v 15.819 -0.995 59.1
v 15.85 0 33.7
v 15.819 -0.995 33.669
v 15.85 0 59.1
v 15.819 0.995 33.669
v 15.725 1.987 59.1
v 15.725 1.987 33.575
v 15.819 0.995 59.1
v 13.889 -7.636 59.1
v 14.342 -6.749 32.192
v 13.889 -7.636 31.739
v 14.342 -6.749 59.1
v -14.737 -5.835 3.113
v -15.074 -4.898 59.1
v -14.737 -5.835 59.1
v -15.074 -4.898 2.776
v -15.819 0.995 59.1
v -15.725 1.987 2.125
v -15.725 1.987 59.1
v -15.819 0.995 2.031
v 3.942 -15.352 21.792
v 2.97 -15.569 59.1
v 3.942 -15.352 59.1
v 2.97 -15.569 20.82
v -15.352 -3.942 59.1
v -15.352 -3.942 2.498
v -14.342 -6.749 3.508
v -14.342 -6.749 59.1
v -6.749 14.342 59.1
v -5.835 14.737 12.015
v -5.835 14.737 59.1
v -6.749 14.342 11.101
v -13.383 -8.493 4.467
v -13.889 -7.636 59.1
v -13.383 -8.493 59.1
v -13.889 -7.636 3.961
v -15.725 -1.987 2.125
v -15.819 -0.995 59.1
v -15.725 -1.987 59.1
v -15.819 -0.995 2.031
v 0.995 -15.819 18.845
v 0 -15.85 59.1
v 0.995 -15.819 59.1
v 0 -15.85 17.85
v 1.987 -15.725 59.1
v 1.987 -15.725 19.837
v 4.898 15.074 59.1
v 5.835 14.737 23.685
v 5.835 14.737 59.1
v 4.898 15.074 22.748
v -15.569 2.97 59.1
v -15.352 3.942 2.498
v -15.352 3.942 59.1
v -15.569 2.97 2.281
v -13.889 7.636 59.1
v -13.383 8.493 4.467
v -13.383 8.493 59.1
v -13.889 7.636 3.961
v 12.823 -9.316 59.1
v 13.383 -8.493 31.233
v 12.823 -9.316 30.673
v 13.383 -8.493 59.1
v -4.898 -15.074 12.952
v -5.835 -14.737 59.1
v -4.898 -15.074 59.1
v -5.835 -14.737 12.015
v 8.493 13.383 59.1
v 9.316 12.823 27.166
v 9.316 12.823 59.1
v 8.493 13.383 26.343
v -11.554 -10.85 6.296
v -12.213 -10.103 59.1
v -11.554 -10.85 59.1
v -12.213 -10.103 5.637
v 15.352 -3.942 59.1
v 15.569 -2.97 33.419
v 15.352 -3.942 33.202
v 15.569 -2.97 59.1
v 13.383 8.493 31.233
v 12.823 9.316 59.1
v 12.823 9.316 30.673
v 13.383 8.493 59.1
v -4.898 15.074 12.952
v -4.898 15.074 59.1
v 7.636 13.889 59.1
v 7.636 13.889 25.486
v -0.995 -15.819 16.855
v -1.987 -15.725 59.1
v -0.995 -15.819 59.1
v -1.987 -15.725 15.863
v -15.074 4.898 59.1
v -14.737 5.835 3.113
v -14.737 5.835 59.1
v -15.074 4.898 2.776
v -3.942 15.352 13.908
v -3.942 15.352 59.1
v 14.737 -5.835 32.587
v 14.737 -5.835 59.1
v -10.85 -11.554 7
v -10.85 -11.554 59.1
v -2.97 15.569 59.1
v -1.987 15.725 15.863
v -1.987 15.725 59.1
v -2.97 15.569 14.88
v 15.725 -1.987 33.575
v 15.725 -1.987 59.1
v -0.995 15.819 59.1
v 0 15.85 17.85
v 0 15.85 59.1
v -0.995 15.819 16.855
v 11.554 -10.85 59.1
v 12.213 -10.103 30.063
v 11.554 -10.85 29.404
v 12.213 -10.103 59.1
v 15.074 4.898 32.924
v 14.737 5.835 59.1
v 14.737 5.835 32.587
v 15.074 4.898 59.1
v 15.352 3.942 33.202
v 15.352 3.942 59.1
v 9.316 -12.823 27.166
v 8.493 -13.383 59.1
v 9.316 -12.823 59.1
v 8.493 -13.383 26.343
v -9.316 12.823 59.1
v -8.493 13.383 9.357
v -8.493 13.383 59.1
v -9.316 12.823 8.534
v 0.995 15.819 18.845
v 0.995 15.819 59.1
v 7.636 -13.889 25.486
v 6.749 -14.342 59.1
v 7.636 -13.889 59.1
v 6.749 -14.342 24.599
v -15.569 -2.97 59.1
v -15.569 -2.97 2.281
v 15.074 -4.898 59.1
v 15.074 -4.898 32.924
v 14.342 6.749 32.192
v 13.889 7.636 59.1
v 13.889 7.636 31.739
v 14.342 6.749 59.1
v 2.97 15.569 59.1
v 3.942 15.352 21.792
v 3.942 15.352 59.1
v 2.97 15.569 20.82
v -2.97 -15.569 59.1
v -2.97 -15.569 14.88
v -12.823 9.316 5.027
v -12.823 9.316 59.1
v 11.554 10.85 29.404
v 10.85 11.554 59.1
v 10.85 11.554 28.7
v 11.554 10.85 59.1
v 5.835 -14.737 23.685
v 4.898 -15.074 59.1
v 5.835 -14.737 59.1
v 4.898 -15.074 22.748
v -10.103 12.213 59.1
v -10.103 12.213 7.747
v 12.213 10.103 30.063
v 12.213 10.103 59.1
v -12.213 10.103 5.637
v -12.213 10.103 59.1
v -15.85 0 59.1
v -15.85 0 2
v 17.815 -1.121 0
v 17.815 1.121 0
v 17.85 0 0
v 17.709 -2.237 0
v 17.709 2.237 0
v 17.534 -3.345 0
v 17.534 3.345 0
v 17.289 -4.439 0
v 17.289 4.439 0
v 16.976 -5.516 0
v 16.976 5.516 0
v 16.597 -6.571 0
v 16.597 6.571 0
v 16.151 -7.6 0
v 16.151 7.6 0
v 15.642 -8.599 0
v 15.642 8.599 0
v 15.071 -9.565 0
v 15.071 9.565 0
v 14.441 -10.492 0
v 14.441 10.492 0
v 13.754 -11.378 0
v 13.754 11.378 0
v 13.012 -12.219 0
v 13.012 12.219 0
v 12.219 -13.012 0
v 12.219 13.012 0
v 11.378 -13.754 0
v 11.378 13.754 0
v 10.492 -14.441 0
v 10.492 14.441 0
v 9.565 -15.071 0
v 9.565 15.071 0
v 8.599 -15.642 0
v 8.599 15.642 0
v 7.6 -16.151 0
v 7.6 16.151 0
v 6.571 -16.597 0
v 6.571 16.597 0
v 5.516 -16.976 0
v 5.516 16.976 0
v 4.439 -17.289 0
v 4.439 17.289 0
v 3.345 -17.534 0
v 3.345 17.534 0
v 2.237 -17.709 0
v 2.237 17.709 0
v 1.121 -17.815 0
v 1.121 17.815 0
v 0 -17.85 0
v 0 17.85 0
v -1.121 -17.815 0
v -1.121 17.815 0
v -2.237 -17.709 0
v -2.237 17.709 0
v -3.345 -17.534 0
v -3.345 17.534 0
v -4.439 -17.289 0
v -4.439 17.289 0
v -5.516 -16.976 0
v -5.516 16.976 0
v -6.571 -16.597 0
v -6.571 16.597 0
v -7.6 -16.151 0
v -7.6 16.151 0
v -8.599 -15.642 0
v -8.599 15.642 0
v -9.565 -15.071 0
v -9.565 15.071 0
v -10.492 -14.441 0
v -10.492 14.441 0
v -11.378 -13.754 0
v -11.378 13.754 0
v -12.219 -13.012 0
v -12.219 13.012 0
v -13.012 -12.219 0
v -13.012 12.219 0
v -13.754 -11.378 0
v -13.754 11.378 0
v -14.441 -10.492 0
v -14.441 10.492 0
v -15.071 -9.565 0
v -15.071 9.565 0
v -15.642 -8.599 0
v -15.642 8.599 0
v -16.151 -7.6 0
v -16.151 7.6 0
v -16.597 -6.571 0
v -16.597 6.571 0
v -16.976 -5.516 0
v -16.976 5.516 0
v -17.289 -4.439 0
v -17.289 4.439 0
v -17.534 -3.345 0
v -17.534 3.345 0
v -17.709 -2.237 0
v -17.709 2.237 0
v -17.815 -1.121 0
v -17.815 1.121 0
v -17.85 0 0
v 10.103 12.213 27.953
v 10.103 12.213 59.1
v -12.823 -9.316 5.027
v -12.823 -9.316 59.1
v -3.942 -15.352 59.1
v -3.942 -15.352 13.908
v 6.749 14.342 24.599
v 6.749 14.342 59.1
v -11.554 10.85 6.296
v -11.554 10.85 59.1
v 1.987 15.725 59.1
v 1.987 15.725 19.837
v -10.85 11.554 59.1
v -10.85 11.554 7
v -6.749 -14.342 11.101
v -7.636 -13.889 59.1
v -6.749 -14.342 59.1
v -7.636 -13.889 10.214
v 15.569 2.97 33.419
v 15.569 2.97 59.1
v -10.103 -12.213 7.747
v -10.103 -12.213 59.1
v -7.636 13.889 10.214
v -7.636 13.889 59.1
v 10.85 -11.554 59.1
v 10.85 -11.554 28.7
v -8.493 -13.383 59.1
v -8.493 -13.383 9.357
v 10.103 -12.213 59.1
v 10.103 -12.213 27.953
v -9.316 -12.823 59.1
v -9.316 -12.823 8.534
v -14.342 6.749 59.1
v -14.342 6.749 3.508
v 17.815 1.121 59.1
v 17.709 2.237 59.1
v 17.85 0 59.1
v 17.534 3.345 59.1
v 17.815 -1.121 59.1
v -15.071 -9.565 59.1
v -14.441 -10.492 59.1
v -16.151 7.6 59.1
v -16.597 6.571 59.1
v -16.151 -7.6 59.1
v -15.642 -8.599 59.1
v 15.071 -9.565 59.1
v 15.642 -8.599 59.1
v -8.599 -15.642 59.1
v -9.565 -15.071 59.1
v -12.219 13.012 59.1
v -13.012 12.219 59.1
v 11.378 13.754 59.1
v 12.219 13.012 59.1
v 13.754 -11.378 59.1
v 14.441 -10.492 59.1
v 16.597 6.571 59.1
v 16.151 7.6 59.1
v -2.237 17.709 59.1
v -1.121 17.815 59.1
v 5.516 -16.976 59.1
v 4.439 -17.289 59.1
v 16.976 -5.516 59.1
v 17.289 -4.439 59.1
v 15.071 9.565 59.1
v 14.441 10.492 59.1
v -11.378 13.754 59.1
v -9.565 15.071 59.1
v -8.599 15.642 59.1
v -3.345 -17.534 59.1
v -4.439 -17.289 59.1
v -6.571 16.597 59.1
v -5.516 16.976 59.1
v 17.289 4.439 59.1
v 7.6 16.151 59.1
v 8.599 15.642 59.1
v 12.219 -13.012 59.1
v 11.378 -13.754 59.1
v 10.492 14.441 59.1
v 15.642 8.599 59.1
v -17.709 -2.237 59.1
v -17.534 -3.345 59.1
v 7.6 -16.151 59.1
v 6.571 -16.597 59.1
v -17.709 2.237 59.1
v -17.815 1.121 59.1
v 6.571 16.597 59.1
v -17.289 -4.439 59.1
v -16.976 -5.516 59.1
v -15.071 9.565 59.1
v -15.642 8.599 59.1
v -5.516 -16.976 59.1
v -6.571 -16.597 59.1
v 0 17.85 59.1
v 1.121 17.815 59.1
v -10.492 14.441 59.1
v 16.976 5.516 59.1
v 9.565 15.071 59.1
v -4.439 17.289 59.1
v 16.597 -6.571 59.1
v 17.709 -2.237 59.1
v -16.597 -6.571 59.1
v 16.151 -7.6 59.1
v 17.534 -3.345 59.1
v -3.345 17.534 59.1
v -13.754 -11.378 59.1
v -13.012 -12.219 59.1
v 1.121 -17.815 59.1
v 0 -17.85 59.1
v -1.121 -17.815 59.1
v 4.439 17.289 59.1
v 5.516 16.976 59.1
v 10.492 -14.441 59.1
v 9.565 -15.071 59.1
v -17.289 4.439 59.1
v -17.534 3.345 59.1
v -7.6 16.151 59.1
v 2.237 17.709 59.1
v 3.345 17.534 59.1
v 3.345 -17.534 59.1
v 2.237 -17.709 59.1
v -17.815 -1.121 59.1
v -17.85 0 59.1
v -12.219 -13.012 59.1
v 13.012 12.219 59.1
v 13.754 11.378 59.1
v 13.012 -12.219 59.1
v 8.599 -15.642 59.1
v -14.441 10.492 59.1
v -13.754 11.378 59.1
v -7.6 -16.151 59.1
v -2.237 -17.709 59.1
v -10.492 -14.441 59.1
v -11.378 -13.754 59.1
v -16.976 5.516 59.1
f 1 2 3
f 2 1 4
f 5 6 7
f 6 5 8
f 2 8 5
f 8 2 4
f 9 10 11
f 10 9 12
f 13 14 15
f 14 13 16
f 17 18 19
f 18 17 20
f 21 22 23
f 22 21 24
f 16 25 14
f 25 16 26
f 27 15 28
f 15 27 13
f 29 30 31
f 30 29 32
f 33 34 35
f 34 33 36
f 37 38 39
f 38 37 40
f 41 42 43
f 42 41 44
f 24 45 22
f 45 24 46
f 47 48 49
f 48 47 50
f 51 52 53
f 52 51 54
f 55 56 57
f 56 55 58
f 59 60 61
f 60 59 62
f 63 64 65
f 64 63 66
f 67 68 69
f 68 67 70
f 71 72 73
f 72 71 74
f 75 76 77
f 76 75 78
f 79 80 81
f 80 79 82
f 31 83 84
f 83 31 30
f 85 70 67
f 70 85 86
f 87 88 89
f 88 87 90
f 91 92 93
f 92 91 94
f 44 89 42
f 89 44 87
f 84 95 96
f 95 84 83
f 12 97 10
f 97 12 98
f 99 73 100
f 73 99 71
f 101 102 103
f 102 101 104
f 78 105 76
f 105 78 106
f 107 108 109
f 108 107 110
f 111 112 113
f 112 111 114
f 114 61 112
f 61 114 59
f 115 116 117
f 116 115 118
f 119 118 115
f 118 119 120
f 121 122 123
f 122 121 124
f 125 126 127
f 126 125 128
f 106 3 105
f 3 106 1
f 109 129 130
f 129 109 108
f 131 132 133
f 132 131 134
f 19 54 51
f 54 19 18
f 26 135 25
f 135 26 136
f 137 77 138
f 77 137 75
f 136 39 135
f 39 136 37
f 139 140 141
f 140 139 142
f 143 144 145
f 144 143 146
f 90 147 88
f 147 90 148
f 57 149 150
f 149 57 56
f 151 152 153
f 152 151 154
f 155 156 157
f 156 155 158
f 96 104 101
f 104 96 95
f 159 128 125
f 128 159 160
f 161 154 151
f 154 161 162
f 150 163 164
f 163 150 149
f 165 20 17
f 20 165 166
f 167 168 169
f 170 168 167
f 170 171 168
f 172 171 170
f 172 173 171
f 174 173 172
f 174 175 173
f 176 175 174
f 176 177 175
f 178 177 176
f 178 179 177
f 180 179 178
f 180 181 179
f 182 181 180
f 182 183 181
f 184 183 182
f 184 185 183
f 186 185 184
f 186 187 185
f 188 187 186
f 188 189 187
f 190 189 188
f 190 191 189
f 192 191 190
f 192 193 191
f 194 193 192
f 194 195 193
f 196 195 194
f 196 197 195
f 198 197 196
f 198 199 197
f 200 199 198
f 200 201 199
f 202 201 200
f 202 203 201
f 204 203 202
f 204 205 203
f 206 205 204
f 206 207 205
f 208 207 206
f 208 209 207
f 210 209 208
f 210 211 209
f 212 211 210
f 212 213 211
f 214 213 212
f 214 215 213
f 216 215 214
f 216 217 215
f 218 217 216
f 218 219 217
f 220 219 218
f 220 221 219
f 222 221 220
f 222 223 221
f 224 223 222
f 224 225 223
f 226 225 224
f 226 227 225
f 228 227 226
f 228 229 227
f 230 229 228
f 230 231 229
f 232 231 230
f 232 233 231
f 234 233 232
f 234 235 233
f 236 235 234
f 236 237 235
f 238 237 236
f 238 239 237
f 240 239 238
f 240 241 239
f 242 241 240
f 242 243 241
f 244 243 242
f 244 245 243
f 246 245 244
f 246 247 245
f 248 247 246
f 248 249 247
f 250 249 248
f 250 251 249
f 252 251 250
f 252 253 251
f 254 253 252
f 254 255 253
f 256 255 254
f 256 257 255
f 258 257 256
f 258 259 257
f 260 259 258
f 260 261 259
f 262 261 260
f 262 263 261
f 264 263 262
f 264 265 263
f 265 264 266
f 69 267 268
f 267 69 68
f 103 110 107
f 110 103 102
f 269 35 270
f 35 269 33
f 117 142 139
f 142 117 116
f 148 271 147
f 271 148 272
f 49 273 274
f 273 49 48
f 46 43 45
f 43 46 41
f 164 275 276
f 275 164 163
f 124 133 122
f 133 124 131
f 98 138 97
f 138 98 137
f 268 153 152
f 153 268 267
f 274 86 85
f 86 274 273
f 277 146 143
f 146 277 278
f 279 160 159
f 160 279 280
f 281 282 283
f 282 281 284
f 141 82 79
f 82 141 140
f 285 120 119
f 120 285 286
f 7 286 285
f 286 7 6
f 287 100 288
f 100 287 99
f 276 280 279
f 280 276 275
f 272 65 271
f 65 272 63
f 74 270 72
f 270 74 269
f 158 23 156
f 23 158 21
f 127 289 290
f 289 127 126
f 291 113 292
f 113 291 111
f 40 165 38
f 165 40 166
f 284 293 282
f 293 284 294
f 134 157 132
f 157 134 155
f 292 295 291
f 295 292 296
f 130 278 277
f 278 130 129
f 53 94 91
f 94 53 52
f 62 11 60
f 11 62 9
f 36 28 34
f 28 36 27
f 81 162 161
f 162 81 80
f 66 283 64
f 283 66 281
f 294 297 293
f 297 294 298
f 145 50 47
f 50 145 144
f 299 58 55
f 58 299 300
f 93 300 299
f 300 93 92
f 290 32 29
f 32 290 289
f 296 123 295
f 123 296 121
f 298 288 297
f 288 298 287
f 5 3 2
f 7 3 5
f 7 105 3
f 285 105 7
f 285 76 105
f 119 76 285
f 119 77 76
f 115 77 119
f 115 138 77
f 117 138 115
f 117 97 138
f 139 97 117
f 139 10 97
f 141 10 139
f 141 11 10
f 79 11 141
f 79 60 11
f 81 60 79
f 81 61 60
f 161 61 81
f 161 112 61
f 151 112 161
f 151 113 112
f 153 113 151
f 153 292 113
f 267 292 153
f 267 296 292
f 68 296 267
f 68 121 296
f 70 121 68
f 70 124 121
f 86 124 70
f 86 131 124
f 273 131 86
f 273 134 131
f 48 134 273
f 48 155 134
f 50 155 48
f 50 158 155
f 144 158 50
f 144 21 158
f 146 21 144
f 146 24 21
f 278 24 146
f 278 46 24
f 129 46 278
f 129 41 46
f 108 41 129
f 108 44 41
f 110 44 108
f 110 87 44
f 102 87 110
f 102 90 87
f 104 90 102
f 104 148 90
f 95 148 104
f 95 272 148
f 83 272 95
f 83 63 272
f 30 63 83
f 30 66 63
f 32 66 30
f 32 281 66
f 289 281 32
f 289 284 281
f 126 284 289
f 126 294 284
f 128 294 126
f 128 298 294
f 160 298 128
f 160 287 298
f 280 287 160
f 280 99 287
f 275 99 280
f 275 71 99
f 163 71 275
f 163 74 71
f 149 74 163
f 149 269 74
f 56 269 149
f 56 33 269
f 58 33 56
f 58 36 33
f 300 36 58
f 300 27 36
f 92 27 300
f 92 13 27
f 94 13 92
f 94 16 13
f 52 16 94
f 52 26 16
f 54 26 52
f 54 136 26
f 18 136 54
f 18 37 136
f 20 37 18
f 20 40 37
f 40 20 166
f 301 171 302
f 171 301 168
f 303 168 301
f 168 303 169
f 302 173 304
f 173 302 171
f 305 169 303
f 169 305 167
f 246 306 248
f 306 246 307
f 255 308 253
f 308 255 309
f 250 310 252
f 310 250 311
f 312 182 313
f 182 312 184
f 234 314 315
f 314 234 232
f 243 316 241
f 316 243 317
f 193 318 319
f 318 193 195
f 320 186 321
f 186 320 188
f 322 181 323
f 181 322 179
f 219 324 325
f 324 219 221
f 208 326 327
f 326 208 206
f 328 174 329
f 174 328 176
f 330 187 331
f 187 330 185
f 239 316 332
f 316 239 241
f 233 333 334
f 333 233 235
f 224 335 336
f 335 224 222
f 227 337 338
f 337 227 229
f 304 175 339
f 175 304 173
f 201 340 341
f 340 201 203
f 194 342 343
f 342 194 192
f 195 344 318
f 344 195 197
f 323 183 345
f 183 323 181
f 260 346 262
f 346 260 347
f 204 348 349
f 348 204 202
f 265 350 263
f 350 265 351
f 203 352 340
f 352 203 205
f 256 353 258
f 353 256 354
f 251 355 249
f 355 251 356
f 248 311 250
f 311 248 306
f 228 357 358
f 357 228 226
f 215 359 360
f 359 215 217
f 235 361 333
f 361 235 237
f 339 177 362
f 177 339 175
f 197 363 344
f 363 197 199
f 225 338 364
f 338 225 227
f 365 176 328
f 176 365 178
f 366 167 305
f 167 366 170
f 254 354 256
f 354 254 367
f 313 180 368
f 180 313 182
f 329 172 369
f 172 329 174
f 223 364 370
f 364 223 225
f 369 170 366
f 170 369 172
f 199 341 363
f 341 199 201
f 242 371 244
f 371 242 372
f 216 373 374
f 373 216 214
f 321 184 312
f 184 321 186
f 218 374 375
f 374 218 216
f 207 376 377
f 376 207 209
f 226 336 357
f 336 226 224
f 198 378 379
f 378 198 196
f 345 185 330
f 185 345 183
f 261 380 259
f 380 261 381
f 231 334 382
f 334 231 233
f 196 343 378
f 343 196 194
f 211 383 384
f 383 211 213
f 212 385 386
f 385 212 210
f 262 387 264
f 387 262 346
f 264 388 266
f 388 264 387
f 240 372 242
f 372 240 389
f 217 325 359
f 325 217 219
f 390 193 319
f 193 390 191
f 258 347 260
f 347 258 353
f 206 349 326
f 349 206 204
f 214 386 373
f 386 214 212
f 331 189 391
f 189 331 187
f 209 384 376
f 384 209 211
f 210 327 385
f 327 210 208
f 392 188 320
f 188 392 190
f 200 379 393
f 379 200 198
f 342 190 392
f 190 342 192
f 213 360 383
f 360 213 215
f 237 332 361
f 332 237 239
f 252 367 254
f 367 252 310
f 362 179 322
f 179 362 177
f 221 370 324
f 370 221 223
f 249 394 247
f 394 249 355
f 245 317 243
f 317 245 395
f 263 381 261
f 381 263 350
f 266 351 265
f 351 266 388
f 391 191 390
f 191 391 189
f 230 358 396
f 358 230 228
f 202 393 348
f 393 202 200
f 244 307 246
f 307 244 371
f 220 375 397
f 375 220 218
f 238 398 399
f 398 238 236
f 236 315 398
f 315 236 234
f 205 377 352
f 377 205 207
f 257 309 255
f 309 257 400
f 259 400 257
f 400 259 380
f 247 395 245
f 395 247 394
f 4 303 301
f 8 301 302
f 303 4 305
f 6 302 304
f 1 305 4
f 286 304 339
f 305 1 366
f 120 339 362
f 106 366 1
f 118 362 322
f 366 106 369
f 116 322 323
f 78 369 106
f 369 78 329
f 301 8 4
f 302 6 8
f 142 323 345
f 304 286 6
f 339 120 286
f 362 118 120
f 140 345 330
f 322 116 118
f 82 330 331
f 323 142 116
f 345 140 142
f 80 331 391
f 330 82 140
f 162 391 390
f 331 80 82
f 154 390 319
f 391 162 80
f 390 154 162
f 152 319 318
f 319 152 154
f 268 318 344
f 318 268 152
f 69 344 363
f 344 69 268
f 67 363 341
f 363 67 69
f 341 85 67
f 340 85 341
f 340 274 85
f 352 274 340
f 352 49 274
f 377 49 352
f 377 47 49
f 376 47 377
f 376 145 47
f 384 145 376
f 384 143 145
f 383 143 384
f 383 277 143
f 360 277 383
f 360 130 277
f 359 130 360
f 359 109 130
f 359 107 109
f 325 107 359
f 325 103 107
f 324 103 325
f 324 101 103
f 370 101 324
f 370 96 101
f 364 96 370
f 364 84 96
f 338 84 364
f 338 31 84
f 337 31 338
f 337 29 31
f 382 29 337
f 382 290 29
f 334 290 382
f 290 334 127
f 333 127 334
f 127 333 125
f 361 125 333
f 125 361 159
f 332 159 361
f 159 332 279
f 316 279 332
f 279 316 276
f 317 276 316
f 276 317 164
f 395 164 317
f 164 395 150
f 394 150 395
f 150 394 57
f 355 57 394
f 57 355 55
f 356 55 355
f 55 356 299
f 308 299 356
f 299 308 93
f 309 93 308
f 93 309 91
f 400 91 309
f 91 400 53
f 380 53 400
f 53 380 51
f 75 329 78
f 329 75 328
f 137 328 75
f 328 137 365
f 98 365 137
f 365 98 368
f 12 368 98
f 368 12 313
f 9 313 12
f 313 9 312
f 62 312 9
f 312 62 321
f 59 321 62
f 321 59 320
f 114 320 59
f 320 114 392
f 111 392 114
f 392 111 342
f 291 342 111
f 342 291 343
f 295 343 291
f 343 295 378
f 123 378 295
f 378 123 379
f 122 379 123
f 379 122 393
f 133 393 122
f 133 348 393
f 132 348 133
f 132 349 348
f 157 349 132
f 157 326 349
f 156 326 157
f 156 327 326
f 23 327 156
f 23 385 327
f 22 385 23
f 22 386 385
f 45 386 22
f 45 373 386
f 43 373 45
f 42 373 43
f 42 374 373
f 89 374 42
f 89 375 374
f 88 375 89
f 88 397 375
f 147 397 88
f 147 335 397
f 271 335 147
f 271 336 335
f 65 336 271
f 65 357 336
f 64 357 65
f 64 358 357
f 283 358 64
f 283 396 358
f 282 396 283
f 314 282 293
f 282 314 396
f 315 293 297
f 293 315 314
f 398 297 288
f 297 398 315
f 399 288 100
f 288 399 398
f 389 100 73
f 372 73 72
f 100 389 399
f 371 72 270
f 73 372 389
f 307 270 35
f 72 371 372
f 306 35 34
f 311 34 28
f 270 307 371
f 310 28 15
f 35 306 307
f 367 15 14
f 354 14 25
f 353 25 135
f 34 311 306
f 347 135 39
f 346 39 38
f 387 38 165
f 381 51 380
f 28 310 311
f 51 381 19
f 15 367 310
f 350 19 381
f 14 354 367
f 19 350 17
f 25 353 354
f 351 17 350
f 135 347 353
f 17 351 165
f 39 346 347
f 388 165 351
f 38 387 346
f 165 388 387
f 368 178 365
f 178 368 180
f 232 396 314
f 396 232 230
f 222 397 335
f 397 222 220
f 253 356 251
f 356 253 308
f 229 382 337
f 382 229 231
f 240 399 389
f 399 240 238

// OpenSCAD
/*

Source:
https://www.sik.dk/Forbruger/Sikkerhed-for-boern-0-3-aar/Er-det-farligt/Test-sikkerheden-med-en-legetoejstester

Den måler 3,17 cm i diameteren, 2,54 cm på den korte side og 5,71 cm på den lange side.

Put legetøjet eller andre små dimser ned i testeren.
Kan dimsen ligge i testeren uden at rage op over kanten, er den farlig for dit barn.
Du må ikke tvinge noget ned i testeren. Uanset hvad du vil teste, skal det altid selv kunne glide ned i testeren uden tvang.

*/

$border = 2;
$diameter = 31.7;
$height = 57.1;

$fn=100;

union () {
  difference () {
    cylinder ($diameter+$border, $diameter/2, $diameter/2);
    translate([-$diameter/2-$border,-$diameter/2-$border,0])
      rotate([0,-45,0])
        cube([$diameter*2,$diameter+$border*2,$diameter]);
  }
  difference() {
    cylinder ($height+$border, $diameter/2+$border, $diameter/2+$border);
    cylinder ($height+$border*2, $diameter/2, $diameter/2);
  }
}
